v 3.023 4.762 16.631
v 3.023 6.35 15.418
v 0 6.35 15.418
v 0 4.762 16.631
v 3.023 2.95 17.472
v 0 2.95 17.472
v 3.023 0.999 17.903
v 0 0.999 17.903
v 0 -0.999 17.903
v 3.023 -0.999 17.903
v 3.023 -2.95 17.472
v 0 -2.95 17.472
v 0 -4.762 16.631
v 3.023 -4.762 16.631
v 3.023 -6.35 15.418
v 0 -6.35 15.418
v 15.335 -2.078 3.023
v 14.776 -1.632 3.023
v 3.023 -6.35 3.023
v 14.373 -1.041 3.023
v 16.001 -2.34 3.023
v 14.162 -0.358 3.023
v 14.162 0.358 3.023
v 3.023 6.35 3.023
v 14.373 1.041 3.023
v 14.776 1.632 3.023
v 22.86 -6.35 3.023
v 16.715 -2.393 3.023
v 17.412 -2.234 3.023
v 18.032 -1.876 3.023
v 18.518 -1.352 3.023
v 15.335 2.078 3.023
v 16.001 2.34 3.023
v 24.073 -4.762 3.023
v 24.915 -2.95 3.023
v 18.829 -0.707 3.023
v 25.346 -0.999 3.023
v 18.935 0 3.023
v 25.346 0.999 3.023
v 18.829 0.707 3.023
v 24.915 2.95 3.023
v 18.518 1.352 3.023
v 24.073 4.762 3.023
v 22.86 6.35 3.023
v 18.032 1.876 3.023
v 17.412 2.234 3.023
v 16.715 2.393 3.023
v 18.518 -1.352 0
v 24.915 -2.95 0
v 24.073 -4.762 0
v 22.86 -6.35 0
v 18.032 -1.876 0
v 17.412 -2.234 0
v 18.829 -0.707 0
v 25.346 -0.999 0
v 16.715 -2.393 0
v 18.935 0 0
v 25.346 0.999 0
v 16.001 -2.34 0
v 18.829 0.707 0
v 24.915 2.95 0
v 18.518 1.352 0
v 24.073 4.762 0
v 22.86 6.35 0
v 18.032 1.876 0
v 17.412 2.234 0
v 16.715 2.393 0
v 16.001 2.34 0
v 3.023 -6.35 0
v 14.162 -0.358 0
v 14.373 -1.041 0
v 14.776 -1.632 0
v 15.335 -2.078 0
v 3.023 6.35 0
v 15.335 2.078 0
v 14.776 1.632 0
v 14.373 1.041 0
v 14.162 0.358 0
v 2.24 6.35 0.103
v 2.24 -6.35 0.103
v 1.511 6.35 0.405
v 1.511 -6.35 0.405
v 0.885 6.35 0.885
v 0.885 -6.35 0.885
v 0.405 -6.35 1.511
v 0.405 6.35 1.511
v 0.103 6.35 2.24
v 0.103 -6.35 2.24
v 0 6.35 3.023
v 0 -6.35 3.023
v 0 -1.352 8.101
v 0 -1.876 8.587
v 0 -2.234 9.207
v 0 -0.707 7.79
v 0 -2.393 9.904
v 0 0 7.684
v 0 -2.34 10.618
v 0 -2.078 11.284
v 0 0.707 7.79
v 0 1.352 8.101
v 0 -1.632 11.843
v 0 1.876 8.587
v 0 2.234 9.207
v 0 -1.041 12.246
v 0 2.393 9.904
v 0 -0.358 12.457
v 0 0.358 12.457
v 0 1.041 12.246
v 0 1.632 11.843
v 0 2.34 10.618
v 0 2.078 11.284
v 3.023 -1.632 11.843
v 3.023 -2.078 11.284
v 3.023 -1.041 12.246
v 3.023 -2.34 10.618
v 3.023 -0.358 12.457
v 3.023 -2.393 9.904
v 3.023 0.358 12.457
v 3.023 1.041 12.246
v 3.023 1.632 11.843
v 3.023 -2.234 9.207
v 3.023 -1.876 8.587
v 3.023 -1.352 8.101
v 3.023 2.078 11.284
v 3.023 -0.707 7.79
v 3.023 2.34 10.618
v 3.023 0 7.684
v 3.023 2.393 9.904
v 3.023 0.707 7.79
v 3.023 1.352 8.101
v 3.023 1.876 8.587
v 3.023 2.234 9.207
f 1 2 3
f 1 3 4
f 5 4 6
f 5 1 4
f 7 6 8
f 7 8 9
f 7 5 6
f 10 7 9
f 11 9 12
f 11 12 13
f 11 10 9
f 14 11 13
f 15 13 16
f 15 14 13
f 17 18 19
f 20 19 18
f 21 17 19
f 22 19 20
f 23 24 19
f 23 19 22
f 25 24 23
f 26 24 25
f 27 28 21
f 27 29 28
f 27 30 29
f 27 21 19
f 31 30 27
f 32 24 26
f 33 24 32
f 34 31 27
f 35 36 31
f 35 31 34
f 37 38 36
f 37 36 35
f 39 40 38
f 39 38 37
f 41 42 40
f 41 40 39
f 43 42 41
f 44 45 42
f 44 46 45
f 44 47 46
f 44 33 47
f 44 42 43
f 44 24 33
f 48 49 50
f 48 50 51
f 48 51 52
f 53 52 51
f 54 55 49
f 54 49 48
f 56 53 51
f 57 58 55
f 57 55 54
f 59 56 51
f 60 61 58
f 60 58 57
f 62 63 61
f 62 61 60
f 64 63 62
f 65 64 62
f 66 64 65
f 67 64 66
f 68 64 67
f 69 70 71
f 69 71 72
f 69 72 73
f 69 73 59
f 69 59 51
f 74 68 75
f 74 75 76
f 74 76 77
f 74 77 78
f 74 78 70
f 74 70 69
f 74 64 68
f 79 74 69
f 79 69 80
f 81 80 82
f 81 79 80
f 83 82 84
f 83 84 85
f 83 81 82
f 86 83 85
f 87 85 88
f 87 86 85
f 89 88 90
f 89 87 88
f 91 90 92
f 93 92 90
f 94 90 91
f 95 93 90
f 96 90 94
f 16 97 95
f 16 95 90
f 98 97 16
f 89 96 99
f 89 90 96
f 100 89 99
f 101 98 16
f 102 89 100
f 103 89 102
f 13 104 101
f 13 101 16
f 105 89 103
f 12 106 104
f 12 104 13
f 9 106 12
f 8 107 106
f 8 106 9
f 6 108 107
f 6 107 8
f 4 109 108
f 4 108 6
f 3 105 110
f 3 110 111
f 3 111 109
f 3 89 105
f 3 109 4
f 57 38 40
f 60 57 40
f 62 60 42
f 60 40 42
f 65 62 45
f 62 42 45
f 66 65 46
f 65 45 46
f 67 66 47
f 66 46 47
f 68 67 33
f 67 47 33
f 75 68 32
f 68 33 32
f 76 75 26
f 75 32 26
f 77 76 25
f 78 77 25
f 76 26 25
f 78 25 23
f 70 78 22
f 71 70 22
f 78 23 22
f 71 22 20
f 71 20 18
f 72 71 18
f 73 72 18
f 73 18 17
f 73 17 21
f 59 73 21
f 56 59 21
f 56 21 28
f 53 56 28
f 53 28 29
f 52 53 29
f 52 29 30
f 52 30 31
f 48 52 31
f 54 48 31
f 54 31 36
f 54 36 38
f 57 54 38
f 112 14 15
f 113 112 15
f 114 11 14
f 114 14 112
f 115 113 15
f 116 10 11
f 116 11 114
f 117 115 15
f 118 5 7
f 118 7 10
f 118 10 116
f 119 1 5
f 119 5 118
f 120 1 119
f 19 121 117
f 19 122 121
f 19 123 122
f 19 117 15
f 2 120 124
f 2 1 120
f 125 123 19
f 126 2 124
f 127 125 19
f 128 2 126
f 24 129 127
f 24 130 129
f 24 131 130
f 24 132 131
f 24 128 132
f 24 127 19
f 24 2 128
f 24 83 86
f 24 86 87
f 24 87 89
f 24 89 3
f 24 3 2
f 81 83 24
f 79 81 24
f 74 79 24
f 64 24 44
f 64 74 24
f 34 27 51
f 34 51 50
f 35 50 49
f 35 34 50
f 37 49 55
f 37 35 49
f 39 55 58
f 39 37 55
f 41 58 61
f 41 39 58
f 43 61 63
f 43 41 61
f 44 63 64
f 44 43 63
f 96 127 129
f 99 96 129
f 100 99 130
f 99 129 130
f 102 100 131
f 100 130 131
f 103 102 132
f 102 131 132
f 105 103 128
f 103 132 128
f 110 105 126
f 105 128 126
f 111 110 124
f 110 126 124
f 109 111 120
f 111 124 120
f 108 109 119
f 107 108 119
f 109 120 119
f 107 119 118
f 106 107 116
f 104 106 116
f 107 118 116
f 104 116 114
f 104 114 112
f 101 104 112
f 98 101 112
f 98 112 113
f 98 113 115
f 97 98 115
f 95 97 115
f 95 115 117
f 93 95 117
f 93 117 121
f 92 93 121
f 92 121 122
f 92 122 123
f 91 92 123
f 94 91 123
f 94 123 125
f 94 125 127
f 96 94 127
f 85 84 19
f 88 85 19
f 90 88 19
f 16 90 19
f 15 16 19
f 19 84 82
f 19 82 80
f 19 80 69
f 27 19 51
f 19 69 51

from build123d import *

# Parameters (mm, degrees)
EXTRUDE_THIN1_DEPTH     = 6.35
CUT_EXTRUDE1_DEPTH      = 23.3774
CUT_EXTRUDE1_DEPTH_BACK = 4.0226
SKETCH7_R               = 2.4
CUT_EXTRUDE3_DEPTH      = 4.0226
CUT_EXTRUDE2_DEPTH      = 15.9352
CUT_EXTRUDE2_DEPTH_BACK = 4.0226
SKETCH8_R               = 2.4
CUT_EXTRUDE4_DEPTH      = 4.0226


with BuildPart() as part:
    # Sketch4 → Extrude-Thin1 (new body, symmetric)
    with BuildSketch(Plane(origin=(0, 0, 0), x_dir=(1, 0, 0), z_dir=(0, 1, 0))):
        with BuildLine():
            Line((25.4, 0), (3.0226, 0))
            ThreePointArc((3.0226, 0), (0.885299043, -0.885299043), (0, -3.0226))
            Line((0, -3.0226), (0, -17.9578))
            Line((0, -17.9578), (3.0226, -17.9578))
            Line((3.0226, -17.9578), (3.0226, -3.0226))
            Line((3.0226, -3.0226), (25.4, -3.0226))
            Line((25.4, -3.0226), (25.4, 0))
        make_face()
    extrude(amount=EXTRUDE_THIN1_DEPTH, both=True)

    # Sketch5 → Cut-Extrude1 (cut, two sides)
    with BuildSketch(Plane(origin=(3.0226, 0, 0), x_dir=(0, 0, -1), z_dir=(1, 0, 0))) as cut_extrude1_sk:
        with BuildLine():
            Line((19.030404457, 42.52061468), (-15.4178, 6.35))
            ThreePointArc((-15.4178, 6.35), (-17.9578, 0), (-15.4178, -6.35))
            Line((-15.4178, -6.35), (19.030404457, -42.52061468))
            Line((19.030404457, -42.52061468), (-80.869388468, -42.52061468))
            Line((-80.869388468, -42.52061468), (-80.869388468, 42.52061468))
            Line((-80.869388468, 42.52061468), (19.030404457, 42.52061468))
        make_face()
    extrude(amount=CUT_EXTRUDE1_DEPTH, mode=Mode.SUBTRACT)
    extrude(cut_extrude1_sk.sketch, amount=-CUT_EXTRUDE1_DEPTH_BACK, mode=Mode.SUBTRACT)

    # Sketch7 → Cut-Extrude3 (cut, through all)
    with BuildSketch(Plane(origin=(3.0226, 0, 0), x_dir=(0, 0, -1), z_dir=(1, 0, 0))):
        with Locations((-10.0838, 0)):
            Circle(SKETCH7_R)
    extrude(amount=-CUT_EXTRUDE3_DEPTH, mode=Mode.SUBTRACT)

    # Sketch6 → Cut-Extrude2 (cut, two sides)
    with BuildSketch(Plane.XY.offset(3.0226)) as cut_extrude2_sk:
        with BuildLine():
            Line((-20.10675939, -51.46509736), (22.86, -6.35))
            ThreePointArc((22.86, -6.35), (25.4, 0), (22.86, 6.35))
            Line((22.86, 6.35), (-20.10675939, 51.46509736))
            Line((-20.10675939, 51.46509736), (104.496842842, 51.46509736))
            Line((104.496842842, 51.46509736), (104.496842842, -51.46509736))
            Line((104.496842842, -51.46509736), (-20.10675939, -51.46509736))
        make_face()
    extrude(amount=CUT_EXTRUDE2_DEPTH, mode=Mode.SUBTRACT)
    extrude(cut_extrude2_sk.sketch, amount=-CUT_EXTRUDE2_DEPTH_BACK, mode=Mode.SUBTRACT)

    # Sketch8 → Cut-Extrude4 (cut, through all)
    with BuildSketch(Plane.XY.offset(3.0226)):
        with Locations((16.5354, 0)):
            Circle(SKETCH8_R)
    extrude(amount=-CUT_EXTRUDE4_DEPTH, mode=Mode.SUBTRACT)


solid = part.part
